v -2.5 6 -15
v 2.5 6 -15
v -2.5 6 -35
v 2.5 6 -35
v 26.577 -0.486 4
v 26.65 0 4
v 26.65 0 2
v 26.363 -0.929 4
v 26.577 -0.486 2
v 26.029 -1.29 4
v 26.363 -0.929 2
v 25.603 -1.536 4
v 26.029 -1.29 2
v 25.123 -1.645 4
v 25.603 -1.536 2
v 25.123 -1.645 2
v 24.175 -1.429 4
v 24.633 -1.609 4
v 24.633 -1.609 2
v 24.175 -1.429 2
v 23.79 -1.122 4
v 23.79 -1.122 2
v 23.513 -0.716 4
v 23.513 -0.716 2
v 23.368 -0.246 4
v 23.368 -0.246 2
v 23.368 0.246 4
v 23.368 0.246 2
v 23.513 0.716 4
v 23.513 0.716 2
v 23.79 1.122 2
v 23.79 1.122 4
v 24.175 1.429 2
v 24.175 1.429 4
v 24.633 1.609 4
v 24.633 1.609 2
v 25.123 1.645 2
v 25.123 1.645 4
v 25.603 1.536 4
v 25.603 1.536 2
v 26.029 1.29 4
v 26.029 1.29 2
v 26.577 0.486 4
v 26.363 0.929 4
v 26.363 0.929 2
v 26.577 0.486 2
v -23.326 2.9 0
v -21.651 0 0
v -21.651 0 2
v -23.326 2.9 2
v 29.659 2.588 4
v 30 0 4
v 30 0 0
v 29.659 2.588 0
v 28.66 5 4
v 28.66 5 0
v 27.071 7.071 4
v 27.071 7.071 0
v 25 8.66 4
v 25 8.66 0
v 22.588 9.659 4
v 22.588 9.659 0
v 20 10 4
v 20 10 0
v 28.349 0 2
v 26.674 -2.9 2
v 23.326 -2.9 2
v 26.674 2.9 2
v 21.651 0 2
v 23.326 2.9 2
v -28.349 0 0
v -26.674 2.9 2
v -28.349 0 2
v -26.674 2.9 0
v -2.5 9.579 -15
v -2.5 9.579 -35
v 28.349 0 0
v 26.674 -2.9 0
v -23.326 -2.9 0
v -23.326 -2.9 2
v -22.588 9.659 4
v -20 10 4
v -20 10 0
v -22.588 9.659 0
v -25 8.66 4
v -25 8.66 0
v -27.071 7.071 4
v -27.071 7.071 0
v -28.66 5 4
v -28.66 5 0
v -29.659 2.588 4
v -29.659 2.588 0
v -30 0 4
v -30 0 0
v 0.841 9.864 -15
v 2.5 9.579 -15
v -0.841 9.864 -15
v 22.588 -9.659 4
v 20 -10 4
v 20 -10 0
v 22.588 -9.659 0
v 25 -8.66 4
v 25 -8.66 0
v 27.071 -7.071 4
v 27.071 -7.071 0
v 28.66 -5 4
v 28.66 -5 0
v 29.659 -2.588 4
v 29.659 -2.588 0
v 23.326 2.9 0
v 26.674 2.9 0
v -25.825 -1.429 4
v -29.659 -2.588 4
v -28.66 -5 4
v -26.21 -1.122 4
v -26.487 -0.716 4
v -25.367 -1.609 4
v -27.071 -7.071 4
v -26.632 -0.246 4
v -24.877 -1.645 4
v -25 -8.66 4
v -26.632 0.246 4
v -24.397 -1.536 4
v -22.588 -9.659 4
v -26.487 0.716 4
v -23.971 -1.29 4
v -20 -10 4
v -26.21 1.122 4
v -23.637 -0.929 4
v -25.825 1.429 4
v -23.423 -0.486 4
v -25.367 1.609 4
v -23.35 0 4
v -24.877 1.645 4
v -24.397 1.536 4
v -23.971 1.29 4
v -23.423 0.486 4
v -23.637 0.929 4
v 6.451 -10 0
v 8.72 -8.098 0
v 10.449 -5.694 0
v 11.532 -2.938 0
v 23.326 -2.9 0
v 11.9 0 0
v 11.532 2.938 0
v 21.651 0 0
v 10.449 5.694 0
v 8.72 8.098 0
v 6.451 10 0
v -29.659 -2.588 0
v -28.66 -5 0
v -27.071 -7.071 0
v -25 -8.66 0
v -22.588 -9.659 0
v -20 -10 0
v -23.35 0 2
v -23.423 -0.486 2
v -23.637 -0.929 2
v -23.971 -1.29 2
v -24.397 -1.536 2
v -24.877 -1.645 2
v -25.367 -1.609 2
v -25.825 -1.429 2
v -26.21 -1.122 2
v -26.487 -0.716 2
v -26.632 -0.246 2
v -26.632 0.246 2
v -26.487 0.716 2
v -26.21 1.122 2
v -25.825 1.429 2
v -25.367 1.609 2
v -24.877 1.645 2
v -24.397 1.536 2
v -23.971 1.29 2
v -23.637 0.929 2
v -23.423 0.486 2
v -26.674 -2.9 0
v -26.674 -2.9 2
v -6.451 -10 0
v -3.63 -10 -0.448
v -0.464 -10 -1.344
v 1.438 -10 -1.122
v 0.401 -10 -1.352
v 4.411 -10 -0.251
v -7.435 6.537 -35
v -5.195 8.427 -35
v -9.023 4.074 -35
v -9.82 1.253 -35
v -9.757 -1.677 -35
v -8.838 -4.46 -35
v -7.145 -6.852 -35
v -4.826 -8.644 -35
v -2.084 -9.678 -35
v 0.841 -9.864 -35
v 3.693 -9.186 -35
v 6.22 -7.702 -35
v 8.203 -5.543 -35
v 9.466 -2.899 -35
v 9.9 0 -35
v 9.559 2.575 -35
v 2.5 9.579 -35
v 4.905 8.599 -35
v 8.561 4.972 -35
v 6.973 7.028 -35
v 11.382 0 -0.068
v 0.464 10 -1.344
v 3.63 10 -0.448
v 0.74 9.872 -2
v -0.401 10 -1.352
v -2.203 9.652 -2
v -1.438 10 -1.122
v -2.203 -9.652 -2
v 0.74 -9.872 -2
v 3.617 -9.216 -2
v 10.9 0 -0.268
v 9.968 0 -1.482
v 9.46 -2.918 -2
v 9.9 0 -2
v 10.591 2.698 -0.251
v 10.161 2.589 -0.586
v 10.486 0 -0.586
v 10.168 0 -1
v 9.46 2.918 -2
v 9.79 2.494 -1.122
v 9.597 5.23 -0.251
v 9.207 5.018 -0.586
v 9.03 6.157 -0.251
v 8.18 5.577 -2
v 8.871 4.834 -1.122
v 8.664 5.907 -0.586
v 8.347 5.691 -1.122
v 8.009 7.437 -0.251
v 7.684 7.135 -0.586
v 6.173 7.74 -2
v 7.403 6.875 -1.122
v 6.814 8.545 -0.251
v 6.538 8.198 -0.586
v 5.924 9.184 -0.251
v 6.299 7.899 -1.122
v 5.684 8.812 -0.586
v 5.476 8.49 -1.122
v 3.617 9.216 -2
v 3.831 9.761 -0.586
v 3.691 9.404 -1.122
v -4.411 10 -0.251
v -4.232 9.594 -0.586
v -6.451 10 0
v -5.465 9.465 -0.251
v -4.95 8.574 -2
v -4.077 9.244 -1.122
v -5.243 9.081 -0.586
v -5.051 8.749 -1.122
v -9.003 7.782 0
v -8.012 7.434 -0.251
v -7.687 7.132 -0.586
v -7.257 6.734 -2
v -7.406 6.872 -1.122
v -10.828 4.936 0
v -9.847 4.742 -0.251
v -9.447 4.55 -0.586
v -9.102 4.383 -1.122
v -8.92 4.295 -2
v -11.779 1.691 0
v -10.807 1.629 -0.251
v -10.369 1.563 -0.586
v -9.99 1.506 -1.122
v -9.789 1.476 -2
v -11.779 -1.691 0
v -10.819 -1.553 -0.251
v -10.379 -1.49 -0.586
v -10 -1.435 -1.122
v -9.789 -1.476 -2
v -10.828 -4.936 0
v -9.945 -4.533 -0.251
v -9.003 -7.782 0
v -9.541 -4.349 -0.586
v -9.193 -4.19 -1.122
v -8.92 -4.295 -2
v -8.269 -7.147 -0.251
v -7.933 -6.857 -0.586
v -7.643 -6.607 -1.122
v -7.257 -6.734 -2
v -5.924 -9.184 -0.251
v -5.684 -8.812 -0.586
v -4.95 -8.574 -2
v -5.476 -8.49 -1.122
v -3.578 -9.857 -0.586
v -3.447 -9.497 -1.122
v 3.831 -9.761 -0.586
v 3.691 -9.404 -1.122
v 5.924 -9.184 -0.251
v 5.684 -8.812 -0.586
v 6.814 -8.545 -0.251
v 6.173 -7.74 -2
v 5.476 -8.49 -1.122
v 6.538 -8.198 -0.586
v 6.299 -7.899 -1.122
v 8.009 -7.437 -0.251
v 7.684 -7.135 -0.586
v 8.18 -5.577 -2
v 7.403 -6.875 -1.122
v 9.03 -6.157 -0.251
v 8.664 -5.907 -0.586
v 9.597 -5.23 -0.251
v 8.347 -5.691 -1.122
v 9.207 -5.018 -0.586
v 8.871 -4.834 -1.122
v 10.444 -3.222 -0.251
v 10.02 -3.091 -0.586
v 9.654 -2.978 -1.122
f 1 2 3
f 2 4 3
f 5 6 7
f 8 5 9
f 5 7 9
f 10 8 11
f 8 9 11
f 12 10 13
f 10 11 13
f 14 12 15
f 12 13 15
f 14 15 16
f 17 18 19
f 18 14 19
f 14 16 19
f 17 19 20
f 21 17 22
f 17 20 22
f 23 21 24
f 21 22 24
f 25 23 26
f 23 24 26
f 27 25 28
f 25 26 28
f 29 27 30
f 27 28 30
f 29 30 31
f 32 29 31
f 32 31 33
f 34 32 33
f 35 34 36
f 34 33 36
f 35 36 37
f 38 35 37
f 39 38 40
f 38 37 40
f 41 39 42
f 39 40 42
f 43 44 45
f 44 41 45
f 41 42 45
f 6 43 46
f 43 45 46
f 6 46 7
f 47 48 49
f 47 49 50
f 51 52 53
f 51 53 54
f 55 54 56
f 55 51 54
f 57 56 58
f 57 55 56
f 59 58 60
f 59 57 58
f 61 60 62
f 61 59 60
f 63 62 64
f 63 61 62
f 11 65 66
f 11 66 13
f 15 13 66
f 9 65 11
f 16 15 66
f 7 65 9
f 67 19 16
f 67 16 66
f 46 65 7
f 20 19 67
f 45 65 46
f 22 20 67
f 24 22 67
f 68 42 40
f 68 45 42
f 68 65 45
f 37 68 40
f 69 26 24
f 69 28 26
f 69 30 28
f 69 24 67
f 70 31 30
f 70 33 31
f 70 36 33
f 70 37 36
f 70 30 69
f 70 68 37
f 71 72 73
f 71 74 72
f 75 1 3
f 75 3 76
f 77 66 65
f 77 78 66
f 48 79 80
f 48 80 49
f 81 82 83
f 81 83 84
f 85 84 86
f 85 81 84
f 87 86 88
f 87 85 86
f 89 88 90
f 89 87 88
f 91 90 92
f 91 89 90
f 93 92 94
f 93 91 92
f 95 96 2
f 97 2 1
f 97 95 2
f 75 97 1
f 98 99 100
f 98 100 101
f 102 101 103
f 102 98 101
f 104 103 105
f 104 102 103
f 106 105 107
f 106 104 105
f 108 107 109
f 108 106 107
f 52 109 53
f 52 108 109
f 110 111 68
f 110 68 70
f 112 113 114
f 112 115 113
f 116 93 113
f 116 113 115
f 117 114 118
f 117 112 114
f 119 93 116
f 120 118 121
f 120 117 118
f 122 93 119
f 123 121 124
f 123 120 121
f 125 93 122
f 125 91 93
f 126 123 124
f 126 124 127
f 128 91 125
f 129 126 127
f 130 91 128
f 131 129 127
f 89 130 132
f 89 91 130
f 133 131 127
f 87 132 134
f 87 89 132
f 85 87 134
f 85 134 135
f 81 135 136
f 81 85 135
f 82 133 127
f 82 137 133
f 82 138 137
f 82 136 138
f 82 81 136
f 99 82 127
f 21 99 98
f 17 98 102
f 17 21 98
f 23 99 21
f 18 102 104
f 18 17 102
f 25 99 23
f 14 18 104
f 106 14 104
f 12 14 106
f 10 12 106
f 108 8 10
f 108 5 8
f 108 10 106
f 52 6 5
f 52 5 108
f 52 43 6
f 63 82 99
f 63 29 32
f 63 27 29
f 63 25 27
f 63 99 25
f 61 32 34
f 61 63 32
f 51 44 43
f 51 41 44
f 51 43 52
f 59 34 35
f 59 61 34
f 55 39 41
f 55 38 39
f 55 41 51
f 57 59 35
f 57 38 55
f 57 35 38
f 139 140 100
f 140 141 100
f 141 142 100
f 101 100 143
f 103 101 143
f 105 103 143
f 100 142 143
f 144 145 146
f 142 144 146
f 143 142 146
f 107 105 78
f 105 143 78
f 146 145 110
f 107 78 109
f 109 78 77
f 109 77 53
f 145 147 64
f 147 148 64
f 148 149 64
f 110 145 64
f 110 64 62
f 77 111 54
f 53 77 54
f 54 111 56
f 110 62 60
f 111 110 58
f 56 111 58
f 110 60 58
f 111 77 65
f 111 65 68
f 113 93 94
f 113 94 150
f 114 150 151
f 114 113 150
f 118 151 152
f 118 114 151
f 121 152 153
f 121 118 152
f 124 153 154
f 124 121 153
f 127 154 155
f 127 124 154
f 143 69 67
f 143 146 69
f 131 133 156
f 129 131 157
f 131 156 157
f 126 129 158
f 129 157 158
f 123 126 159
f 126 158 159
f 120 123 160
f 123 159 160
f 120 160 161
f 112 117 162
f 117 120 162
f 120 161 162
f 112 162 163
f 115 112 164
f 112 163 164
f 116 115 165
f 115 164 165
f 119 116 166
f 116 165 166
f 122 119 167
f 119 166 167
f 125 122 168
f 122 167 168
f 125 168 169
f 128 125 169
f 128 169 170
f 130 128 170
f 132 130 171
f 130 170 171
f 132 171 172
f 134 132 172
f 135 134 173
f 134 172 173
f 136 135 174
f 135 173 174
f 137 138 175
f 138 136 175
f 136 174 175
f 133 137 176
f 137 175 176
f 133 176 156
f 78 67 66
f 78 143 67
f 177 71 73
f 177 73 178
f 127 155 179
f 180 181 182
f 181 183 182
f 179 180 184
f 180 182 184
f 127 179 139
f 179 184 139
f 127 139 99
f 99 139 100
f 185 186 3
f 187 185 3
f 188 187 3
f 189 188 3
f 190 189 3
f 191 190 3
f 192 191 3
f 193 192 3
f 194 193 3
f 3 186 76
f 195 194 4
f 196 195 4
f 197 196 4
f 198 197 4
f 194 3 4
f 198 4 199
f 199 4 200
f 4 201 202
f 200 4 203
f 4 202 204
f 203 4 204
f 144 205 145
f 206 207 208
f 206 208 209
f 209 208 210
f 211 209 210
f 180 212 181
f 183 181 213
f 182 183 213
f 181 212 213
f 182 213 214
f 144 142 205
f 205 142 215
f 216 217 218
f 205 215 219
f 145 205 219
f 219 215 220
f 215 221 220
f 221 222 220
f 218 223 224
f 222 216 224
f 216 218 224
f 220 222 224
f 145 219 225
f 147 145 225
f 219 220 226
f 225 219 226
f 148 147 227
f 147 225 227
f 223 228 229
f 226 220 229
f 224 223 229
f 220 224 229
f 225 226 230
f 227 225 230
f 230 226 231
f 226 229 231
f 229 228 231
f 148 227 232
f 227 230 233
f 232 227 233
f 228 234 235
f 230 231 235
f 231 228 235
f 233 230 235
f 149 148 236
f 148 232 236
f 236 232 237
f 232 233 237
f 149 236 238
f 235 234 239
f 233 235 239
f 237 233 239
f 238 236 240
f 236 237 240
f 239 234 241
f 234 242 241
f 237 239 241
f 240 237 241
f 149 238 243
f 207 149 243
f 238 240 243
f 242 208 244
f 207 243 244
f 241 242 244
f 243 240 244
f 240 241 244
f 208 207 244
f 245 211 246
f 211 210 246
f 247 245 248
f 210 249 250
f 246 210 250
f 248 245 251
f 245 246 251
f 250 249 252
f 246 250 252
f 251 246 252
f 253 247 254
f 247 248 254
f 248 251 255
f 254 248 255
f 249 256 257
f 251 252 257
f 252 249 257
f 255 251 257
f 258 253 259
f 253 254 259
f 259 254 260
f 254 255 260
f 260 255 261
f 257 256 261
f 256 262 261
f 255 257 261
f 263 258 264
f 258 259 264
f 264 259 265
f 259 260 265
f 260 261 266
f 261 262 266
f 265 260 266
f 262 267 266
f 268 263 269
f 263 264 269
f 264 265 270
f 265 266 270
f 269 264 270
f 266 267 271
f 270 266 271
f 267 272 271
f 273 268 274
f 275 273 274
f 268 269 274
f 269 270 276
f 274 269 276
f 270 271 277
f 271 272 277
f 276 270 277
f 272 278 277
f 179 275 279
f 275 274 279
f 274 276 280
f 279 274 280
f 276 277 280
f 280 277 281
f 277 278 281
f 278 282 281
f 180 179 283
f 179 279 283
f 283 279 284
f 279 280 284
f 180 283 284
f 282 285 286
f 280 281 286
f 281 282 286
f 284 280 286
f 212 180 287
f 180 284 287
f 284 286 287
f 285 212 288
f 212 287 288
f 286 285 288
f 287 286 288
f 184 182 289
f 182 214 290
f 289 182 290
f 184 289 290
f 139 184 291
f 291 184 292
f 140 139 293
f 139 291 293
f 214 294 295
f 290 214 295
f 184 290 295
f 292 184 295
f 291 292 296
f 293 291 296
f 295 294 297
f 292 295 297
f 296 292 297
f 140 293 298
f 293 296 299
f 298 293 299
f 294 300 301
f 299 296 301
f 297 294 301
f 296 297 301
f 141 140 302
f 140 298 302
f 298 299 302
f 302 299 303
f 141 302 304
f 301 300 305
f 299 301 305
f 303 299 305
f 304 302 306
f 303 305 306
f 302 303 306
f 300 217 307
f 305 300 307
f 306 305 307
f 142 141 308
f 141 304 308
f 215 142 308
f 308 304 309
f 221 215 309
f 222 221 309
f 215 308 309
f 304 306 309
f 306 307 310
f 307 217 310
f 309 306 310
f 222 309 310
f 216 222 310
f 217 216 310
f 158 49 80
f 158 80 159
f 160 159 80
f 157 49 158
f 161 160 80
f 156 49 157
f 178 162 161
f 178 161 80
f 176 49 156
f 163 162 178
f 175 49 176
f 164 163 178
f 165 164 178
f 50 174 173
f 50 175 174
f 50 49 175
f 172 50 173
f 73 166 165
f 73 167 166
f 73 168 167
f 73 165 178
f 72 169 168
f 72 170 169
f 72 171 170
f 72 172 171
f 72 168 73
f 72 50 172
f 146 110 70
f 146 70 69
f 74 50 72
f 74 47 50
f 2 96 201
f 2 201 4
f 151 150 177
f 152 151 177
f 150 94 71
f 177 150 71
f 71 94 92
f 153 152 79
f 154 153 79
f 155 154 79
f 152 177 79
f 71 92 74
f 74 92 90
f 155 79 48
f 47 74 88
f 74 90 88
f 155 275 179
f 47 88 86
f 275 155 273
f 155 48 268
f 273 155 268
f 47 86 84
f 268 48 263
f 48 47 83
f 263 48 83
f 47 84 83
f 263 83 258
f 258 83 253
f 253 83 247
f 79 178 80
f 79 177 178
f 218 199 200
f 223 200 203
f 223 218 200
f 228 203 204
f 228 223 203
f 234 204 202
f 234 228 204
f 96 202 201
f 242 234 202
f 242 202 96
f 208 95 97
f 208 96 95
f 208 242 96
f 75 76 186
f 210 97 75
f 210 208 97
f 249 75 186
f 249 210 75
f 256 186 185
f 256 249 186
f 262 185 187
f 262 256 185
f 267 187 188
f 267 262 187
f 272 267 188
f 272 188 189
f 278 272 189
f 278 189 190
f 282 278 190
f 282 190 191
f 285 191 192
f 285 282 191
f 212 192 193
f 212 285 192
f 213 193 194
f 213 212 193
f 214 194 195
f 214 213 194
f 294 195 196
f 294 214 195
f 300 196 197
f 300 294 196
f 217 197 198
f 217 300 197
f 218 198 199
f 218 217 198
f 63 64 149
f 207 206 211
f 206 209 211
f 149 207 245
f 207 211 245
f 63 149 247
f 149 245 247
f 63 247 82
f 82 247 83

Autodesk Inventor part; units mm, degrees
ref_plane "YZ Plane" through (0, 0, 0) normal (1, 0, 0) x (0, 1, 0)
ref_plane "XZ Plane" through (0, 0, 0) normal (0, 1, 0) x (-1, 0, 0)
ref_plane "XY Plane" through (0, 0, 0) normal (0, 0, 1) x (1, 0, 0)
sketch "Sketch1" plane through (0, 0, 0) normal (0, 0, 1) x (1, 0, 0)
  line L0 (-30, -10) -> (30, -10)
  line L1 (30, -10) -> (30, 10)
  line L2 (30, 10) -> (-30, 10)
  line L3 (-30, 10) -> (-30, -10)
  line L4 (-30, -10) -> (30, 10) construction
  line L5 (30, -10) -> (-30, 10) construction
  circle A0 centre (0, 0) radius 9.9
  circle A1 centre (-25, 0) radius 1.65
  circle A2 centre (25, 0) radius 1.65
  line L6 (-25, 0) -> (25, 0) construction
  point P0 (-30, 0)
  dimension "d0" = 60
  dimension "d1" = 19.8
  dimension "d2" = 20
  dimension "d3" = 50
  dimension "d4" = 3.3
extrude "Extrusion1" add sketch "Sketch1" along normal blind 4 contours L3 L2 L1 L0 | A0
extrude "Extrusion2" add sketch "Sketch1" against normal blind 35 contours A0
fillet "Fillet1" radius 2 1 edges at (-9.9, 0, 0)
fillet "Fillet2" radius 10 4 edges at (30, 10, 2) (30, -10, 2) (-30, 10, 2) (-30, -10, 2)
sketch "Sketch2" plane through (0, 0, -35) normal (0, 0, -1) x (-1, 0, 0)
  circle A0 centre (0, 0) radius 9.9 projected
  line L0 (-2.5, 0) -> (2.5, 0)
  line L1 (2.5, 0) -> (2.5, 12)
  line L2 (2.5, 12) -> (-2.5, 12)
  line L3 (-2.5, 12) -> (-2.5, 0)
  line L4 (-2.5, 6) -> (2.5, 6)
  point P0 (0, 12)
  point P1 (2.5, 9.5791)
  point P2 (-2.5, 9.5791)
  dimension "d11" = 12
  dimension "d12" = 5
  dimension "d13" = 6
extrude "Extrusion3" cut sketch "Sketch2" against normal blind 20 contours L1 L4 L3 A0
sketch "Sketch3" plane through (0, 0, 0) normal (0, 0, -1) x (-1, 0, 0)
  arc A0 (-20, 10) -> (-20, -10) centre (-20, 0) ccw projected
  line L0 (-6.4506, -10) -> (-20, -10) projected
  arc A1 (-6.4506, 10) -> (-6.4506, -10) centre (0, 0) ccw projected
  line L1 (-20, 10) -> (-6.4506, 10) projected
  circle A2 centre (-25, 0) radius 1.65 projected
  line L2 (-28.3486, 0) -> (-26.6743, 2.9)
  line L3 (-26.6743, 2.9) -> (-23.3257, 2.9)
  line L4 (-23.3257, 2.9) -> (-21.6514, 0)
  line L5 (-21.6514, 0) -> (-23.3257, -2.9)
  line L6 (-23.3257, -2.9) -> (-26.6743, -2.9)
  line L7 (-26.6743, -2.9) -> (-28.3486, 0)
  circle A3 centre (25, 0) radius 1.65 projected
  line L8 (23.3257, 2.9) -> (26.6743, 2.9)
  line L9 (26.6743, 2.9) -> (28.3486, 0)
  line L10 (28.3486, 0) -> (26.6743, -2.9)
  line L11 (26.6743, -2.9) -> (23.3257, -2.9)
  line L12 (23.3257, -2.9) -> (21.6514, 0)
  line L13 (21.6514, 0) -> (23.3257, 2.9)
  point P0 (-25, 2.9)
  dimension "d16" = 5.8
  dimension "d17" = 5.8
extrude "Extrusion4" cut sketch "Sketch3" against normal blind 2 contours L2 L3 L4 L5 L6 L7 | L8 L9 L10 L11 L12 L13
properties part number "GIRO_1" material "Steel, Mild, Welded"
